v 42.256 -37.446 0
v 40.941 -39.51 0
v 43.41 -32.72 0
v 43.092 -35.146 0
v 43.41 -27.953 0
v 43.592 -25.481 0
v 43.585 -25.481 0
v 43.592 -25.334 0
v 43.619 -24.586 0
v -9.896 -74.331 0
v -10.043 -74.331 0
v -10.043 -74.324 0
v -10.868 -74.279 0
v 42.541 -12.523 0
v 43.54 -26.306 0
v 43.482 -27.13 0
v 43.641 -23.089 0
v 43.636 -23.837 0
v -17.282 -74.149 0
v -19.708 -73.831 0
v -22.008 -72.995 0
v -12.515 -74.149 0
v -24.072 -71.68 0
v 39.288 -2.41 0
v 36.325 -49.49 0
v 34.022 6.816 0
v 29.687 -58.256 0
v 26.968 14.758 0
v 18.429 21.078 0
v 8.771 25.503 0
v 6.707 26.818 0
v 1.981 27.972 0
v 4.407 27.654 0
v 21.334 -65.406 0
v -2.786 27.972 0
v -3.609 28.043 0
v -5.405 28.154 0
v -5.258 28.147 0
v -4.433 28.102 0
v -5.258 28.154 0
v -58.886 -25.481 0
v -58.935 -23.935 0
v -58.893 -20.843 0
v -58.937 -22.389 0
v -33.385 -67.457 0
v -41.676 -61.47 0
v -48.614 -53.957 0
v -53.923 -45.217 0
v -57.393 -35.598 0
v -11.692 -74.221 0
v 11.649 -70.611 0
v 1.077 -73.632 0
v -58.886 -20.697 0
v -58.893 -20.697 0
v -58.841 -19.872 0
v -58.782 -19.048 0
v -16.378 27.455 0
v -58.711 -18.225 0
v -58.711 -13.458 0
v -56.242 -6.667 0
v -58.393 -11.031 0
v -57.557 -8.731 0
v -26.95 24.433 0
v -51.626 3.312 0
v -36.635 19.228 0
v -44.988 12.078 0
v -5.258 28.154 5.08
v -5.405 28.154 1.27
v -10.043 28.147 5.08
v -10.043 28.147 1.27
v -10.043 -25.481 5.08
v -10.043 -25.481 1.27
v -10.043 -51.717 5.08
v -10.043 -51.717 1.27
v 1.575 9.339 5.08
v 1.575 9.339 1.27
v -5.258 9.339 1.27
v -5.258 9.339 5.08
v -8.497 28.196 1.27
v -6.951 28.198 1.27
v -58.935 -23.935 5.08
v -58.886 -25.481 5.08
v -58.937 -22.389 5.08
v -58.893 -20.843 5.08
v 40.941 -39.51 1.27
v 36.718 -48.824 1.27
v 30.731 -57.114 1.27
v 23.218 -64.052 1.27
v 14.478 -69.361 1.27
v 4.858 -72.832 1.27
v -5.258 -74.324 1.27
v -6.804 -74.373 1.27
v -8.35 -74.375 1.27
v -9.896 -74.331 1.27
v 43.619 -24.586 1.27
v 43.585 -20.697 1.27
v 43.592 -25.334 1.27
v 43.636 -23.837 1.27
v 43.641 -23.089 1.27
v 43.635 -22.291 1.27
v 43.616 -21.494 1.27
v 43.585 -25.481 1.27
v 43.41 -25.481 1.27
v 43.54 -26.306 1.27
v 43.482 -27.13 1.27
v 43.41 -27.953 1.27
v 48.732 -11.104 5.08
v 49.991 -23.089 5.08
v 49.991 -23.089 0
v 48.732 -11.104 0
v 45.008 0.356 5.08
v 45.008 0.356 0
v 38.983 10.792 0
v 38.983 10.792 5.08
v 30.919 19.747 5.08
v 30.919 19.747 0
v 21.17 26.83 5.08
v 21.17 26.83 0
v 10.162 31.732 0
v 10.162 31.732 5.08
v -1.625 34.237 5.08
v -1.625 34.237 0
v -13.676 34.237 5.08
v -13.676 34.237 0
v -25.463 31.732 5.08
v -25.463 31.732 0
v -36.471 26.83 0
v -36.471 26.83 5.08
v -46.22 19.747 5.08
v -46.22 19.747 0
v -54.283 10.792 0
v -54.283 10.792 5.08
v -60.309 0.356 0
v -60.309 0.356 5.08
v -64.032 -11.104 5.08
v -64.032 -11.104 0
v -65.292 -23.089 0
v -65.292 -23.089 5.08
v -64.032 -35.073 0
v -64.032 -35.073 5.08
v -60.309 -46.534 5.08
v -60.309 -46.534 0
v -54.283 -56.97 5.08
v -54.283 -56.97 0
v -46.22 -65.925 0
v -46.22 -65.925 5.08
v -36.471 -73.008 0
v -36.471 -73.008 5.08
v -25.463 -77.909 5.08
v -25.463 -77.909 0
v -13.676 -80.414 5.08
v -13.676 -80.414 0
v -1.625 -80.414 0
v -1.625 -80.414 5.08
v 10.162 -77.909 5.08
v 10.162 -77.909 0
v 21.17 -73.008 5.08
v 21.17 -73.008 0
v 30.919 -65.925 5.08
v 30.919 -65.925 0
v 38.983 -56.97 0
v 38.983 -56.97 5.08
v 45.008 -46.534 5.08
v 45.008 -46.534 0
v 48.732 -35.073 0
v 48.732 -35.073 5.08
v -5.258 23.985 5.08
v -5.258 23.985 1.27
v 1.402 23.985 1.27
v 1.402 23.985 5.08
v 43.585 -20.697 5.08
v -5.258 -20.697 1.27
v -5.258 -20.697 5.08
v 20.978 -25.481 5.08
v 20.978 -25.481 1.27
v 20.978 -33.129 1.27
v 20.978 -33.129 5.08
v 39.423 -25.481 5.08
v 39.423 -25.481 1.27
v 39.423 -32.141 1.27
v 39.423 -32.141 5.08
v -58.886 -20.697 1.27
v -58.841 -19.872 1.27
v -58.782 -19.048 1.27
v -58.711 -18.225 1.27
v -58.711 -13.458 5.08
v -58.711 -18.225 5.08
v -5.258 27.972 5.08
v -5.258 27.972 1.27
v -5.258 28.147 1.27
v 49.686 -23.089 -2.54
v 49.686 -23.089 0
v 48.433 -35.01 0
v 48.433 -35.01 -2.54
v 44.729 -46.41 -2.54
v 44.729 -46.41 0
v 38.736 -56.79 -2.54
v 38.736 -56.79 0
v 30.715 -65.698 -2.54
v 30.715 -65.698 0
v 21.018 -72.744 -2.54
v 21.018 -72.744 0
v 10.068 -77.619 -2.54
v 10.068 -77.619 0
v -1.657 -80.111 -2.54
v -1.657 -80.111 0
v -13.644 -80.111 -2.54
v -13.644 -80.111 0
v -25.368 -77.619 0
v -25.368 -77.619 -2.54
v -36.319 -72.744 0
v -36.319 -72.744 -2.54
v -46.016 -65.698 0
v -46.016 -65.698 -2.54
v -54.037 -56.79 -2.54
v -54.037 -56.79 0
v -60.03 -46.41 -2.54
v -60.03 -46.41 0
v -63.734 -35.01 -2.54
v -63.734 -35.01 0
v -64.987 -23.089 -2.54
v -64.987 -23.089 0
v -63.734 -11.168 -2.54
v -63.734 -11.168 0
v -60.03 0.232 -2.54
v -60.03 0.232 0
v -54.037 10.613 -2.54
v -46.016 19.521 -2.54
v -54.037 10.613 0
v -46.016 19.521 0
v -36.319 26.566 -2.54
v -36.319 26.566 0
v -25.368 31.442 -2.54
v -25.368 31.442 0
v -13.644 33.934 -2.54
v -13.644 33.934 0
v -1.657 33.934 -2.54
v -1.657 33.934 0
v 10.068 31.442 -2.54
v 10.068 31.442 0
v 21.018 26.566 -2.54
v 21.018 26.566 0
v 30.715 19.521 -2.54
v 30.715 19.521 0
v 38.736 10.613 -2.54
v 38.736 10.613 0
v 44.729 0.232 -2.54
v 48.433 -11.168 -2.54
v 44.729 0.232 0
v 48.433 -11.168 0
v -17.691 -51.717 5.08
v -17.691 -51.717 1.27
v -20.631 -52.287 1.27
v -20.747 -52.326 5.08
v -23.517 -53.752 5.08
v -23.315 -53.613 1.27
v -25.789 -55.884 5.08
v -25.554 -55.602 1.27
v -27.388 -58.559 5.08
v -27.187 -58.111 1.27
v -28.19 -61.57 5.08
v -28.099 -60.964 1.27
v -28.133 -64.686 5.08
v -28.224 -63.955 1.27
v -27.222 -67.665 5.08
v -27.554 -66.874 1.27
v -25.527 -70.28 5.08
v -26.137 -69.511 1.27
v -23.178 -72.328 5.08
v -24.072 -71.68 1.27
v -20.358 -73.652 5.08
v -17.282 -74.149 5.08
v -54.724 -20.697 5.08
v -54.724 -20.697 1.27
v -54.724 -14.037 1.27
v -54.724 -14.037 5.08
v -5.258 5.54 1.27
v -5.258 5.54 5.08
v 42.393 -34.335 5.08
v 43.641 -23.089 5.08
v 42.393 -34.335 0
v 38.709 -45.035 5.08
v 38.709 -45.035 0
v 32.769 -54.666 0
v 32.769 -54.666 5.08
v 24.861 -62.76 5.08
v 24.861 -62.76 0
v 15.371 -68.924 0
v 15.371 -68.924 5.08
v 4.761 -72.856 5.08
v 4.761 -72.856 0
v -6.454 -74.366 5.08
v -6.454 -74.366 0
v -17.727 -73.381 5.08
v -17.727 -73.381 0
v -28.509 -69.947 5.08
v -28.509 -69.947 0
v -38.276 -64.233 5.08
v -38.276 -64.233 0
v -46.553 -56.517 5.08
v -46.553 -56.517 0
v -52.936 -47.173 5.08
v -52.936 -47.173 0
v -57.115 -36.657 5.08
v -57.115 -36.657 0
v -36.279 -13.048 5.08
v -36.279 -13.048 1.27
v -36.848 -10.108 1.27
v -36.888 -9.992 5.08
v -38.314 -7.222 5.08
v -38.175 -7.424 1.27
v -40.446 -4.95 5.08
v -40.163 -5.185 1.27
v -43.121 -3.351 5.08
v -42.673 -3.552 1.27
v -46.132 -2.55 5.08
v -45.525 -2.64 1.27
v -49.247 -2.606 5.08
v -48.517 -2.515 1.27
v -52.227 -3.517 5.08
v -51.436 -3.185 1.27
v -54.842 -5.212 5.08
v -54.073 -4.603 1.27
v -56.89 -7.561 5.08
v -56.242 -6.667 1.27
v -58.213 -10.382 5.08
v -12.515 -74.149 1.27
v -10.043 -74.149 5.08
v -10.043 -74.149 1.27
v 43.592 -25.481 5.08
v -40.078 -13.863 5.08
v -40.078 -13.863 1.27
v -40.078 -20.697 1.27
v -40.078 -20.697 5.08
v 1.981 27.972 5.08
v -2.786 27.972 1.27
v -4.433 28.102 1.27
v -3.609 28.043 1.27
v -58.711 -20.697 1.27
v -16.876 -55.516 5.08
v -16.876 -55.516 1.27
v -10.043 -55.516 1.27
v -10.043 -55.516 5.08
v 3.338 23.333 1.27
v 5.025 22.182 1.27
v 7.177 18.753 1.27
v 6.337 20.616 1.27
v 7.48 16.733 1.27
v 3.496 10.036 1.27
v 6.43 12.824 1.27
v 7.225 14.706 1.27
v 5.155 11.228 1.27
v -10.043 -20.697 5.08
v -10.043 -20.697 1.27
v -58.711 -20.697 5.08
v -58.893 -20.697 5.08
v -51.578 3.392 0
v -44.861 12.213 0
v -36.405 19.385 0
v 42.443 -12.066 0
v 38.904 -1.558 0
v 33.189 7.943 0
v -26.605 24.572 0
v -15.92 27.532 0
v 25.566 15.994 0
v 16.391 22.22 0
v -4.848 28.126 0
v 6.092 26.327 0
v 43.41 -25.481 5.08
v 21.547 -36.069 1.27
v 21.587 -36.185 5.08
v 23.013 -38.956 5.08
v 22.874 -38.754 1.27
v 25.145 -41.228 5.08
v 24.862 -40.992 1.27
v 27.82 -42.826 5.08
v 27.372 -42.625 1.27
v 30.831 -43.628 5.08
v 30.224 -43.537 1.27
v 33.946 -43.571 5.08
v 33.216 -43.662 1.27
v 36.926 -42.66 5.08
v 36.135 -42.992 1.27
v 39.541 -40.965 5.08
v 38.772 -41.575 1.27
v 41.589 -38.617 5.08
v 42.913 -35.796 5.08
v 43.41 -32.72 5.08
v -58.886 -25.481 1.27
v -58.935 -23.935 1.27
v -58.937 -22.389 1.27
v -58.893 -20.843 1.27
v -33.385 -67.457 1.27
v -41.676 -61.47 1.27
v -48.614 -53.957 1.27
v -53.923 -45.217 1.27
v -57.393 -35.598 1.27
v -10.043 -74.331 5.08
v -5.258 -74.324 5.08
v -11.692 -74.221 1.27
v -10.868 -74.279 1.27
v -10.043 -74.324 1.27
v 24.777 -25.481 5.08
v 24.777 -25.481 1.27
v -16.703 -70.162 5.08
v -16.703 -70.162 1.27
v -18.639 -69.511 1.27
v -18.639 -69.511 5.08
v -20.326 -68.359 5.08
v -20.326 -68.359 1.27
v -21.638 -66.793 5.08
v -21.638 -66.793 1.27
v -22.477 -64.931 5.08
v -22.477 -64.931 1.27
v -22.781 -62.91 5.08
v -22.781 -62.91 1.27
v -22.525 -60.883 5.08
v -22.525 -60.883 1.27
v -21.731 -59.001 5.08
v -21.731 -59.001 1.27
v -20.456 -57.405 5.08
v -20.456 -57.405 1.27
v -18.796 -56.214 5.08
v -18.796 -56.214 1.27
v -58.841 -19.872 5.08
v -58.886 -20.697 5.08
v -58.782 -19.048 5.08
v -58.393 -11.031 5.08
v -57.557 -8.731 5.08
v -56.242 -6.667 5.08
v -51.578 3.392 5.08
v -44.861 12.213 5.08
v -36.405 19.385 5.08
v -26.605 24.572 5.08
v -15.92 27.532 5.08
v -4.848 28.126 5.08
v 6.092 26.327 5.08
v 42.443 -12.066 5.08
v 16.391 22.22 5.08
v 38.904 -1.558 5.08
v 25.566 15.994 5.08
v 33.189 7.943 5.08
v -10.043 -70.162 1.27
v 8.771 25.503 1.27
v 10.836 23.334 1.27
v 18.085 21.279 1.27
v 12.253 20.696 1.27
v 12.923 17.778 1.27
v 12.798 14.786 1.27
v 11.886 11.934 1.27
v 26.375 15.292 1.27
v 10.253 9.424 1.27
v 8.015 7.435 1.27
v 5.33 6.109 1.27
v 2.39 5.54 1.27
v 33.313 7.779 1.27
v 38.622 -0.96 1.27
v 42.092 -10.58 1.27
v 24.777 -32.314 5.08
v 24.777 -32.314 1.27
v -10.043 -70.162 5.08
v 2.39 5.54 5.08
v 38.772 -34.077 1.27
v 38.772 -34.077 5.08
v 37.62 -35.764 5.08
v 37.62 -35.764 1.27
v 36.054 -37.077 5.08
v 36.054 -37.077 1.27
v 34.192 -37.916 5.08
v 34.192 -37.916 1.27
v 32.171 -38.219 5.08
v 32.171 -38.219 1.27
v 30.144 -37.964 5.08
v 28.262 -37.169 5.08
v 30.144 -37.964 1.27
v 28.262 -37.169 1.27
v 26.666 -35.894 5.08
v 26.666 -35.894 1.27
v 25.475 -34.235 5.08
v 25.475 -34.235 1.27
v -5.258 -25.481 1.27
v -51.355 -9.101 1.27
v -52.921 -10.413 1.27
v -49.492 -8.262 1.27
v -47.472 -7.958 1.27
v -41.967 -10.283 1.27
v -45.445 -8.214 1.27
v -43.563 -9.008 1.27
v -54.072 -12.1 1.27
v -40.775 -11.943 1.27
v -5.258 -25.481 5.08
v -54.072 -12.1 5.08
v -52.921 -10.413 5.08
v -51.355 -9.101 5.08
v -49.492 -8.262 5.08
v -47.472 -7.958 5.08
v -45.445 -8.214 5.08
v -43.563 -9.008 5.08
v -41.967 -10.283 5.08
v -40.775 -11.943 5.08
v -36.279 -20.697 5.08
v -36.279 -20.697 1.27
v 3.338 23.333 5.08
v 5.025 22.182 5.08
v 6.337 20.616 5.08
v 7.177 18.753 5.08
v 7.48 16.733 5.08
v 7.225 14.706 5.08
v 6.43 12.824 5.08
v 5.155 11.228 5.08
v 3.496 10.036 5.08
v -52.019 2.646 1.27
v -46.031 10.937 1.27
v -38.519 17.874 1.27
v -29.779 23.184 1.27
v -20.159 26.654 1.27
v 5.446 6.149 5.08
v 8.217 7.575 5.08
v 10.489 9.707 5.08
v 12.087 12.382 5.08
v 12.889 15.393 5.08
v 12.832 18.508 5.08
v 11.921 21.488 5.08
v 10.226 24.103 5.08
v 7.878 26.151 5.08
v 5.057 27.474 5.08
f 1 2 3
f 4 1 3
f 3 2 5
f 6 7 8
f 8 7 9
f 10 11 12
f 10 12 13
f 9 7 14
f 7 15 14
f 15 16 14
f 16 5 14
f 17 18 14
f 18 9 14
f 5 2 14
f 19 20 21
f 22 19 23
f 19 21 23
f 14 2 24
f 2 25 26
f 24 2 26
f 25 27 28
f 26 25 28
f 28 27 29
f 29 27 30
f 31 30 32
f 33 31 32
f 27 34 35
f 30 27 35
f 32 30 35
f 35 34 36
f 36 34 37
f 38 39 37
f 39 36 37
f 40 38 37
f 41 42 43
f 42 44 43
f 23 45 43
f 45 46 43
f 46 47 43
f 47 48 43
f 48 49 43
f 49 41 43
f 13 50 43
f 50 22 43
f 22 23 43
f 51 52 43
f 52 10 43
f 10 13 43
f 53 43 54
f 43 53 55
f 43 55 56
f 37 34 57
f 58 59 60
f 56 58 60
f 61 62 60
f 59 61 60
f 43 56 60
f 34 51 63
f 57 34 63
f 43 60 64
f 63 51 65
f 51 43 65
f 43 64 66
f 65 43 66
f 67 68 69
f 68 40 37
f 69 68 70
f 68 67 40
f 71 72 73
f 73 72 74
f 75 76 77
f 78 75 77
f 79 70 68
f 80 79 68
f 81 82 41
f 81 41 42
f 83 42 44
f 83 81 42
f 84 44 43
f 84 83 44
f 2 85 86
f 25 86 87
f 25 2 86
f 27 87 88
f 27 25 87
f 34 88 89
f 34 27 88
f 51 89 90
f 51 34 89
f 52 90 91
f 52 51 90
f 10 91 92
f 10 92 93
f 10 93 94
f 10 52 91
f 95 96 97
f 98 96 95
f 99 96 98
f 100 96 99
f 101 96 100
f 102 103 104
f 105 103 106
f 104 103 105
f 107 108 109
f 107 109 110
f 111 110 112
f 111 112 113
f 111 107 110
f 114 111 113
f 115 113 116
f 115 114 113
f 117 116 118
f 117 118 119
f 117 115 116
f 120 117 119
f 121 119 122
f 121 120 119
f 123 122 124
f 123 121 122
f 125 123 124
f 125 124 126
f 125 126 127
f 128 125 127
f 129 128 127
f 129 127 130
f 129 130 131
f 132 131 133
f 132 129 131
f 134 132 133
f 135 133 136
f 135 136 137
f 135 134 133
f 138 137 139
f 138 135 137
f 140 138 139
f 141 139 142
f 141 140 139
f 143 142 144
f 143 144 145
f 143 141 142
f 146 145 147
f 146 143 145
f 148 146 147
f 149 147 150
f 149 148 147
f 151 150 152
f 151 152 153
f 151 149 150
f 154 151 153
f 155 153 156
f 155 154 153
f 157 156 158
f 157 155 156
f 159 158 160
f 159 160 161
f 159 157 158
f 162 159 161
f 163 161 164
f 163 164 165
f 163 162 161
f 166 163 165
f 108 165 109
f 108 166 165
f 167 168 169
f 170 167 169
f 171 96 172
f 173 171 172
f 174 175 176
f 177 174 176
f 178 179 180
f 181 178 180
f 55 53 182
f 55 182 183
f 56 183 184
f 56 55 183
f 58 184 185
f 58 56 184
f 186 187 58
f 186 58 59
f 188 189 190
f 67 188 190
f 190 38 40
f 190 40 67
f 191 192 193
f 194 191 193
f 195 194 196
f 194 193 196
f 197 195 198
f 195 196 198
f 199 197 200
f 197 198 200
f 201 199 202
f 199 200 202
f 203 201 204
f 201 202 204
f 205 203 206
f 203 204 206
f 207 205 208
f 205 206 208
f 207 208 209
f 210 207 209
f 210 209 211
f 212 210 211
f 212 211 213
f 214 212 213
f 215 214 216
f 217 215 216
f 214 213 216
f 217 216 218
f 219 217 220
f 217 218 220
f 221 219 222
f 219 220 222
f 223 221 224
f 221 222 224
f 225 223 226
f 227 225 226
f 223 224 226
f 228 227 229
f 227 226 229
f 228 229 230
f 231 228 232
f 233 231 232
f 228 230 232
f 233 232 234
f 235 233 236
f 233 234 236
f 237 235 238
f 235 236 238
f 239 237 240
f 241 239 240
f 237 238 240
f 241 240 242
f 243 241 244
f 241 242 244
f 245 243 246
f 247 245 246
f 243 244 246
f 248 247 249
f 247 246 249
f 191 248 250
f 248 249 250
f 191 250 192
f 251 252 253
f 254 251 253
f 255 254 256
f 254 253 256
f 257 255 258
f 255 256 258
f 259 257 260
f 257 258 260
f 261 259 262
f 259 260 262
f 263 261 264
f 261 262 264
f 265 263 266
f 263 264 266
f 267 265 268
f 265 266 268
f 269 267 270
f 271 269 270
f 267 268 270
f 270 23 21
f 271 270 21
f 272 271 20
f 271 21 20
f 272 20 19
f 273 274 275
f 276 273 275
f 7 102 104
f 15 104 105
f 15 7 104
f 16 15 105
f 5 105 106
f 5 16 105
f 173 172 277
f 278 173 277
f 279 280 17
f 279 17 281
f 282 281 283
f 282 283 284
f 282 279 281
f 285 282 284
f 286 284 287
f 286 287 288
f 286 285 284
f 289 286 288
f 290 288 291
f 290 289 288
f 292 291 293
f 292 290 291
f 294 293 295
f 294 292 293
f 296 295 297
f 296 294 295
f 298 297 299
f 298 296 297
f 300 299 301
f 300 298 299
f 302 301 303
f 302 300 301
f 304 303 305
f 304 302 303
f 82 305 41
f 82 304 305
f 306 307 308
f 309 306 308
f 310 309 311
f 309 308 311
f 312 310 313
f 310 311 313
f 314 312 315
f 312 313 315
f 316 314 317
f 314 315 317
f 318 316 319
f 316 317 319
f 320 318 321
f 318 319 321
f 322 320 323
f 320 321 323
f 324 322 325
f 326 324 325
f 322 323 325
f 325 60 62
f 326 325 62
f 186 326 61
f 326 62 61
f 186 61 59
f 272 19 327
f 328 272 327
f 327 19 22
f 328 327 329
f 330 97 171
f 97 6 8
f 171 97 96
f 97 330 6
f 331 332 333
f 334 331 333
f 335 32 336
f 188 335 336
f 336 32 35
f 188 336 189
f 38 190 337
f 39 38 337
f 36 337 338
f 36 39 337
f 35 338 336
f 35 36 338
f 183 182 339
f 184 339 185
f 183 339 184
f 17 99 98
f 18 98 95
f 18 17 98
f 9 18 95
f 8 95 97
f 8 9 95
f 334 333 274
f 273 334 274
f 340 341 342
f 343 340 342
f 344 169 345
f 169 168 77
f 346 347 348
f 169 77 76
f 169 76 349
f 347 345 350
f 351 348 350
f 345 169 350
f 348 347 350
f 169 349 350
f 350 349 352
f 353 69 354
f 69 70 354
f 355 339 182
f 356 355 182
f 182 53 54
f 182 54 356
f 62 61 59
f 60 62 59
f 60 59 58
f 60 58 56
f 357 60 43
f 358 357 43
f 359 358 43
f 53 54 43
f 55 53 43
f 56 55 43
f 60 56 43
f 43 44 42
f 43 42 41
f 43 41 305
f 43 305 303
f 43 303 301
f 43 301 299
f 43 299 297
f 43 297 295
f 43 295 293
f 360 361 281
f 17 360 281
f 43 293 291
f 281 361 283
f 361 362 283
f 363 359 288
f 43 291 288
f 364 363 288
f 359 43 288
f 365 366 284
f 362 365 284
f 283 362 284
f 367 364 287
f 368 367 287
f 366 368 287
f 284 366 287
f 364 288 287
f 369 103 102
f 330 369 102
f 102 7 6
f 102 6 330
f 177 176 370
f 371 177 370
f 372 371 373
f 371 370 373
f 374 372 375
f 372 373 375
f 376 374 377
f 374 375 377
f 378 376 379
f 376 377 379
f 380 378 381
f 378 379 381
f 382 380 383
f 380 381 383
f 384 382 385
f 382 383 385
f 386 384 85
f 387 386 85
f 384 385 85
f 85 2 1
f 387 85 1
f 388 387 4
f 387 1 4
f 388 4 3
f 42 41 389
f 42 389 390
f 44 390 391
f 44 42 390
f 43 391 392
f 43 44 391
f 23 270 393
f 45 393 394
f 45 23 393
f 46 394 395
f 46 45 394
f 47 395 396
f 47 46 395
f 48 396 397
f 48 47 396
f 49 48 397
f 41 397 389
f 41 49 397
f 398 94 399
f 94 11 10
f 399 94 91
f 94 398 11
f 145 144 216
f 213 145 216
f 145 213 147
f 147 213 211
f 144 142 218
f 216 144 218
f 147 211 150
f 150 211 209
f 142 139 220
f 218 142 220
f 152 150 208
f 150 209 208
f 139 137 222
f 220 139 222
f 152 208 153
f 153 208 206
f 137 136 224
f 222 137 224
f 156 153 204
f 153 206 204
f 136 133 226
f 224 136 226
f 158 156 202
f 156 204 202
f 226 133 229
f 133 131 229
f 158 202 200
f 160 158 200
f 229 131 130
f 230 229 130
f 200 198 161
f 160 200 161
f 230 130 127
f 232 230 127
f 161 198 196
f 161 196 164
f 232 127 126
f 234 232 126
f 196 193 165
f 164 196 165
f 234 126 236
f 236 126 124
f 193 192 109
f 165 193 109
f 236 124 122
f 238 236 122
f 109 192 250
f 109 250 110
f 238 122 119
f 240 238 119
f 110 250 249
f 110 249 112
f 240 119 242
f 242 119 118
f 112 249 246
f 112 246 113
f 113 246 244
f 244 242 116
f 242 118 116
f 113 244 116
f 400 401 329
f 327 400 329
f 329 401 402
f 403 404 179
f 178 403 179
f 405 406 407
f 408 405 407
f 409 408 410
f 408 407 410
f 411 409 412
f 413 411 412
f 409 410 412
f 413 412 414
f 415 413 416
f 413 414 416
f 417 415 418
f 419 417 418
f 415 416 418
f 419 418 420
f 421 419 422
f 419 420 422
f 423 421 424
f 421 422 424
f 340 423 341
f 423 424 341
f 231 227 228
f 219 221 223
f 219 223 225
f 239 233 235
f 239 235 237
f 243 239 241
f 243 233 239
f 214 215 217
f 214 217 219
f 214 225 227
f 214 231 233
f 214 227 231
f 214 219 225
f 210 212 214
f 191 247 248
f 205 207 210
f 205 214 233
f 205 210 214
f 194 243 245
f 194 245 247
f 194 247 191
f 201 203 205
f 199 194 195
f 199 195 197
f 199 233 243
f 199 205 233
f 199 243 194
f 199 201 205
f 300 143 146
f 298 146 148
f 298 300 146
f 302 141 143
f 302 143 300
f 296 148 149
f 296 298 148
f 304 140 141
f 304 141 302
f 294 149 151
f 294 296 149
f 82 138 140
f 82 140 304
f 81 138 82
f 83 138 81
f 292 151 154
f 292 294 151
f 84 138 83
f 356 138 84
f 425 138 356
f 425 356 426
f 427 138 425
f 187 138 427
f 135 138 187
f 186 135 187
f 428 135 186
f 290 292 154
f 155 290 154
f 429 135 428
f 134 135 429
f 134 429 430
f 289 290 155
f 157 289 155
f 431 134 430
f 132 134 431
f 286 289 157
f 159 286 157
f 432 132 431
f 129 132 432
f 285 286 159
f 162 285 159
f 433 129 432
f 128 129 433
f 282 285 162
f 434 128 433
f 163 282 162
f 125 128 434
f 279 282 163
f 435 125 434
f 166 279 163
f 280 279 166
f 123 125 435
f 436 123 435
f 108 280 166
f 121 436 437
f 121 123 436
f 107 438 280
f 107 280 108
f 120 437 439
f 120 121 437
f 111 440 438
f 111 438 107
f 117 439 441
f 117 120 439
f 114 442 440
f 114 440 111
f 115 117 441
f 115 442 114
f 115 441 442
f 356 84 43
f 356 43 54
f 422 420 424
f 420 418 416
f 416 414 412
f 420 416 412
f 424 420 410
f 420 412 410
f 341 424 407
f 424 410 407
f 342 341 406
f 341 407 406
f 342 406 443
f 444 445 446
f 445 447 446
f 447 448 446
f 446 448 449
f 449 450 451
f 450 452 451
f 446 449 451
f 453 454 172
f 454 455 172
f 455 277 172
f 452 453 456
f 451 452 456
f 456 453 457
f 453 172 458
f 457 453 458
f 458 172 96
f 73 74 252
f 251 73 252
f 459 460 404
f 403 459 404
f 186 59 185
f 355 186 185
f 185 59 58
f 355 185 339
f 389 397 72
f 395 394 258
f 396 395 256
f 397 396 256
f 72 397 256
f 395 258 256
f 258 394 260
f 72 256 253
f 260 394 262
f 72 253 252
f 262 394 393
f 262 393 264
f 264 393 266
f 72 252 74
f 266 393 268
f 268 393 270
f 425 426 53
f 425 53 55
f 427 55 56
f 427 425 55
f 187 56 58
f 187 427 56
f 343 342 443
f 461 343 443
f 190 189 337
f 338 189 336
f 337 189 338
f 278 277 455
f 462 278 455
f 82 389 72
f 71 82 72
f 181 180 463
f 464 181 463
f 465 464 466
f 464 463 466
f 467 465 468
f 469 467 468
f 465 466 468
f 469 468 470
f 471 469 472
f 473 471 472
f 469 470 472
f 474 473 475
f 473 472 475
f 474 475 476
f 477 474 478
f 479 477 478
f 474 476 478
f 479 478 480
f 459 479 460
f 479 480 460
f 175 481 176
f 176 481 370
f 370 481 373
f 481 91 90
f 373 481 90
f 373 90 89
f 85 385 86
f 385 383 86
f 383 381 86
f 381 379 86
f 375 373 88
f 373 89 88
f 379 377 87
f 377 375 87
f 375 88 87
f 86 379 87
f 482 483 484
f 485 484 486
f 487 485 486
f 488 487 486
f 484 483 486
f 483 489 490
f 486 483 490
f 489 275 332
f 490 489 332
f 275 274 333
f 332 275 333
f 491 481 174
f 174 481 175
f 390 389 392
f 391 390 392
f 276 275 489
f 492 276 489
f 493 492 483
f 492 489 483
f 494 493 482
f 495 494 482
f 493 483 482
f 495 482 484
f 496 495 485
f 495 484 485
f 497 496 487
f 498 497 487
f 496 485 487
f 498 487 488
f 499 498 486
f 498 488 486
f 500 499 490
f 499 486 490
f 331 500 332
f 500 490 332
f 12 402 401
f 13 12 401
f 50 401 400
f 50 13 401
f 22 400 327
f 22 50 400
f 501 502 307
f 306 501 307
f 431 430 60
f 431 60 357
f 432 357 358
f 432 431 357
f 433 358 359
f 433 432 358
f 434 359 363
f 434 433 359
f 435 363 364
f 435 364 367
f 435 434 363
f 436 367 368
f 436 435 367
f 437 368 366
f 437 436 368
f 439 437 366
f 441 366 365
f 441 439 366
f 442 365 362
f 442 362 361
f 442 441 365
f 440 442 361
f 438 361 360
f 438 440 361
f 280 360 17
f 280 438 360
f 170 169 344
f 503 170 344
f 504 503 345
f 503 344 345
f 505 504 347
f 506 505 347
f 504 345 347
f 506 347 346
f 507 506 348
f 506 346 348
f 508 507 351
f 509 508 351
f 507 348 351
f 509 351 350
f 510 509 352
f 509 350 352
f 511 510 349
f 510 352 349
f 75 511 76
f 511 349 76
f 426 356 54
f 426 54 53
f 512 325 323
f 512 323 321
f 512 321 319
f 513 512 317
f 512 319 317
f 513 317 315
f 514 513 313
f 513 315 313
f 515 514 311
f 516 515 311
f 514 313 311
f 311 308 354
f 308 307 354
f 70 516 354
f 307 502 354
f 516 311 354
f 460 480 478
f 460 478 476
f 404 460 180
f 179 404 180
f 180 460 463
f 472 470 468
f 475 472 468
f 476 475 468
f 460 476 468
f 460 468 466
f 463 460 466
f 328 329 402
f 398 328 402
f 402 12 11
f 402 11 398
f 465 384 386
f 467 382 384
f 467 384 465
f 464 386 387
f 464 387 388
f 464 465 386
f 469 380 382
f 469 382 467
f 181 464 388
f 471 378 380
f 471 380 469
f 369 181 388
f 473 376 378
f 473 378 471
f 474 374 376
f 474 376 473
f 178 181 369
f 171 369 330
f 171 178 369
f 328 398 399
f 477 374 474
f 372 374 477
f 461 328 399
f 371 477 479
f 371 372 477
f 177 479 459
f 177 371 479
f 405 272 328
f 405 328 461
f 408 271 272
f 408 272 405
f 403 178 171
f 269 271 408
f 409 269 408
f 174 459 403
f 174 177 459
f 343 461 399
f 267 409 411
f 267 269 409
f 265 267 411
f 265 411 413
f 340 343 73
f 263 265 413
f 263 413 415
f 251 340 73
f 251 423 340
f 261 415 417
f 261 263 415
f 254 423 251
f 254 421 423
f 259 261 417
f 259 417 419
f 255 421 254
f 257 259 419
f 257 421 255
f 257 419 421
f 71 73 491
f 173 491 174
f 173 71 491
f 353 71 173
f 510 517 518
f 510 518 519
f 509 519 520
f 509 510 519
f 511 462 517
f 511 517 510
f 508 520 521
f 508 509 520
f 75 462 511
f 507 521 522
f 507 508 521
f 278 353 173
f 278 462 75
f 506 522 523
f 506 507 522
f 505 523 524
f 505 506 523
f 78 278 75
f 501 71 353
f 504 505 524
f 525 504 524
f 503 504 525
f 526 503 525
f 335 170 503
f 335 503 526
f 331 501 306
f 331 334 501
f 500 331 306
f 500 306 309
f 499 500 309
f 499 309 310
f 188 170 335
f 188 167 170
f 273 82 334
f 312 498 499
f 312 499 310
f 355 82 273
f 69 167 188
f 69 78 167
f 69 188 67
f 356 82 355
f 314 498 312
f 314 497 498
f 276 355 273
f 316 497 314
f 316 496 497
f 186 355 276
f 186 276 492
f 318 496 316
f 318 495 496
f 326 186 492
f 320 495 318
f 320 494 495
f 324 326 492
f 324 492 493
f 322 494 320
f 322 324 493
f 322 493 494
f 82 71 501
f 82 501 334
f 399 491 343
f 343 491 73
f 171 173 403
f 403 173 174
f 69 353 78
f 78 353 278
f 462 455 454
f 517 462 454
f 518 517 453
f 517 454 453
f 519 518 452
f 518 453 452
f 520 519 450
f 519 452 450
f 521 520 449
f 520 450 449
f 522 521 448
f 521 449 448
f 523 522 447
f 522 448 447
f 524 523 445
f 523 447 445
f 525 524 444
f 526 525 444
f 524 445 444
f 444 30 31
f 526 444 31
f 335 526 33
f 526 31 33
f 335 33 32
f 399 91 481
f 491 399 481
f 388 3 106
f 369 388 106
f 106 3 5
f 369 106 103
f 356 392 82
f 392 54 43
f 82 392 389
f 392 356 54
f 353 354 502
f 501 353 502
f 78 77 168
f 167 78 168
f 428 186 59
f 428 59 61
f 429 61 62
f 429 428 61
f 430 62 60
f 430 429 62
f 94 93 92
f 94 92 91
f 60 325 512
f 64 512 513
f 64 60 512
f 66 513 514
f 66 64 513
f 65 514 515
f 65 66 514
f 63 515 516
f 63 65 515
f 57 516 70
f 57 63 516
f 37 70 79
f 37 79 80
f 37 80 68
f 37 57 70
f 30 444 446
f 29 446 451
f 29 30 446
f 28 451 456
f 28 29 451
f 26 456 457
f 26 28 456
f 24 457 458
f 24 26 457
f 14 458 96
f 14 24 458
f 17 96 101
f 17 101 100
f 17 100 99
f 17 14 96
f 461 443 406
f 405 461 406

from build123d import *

# Parameters (mm, degrees)
F1_DEPTH = 5.08
F3_COUNT = 4
F4_R     = 57.6415248938
F5_DEPTH = 5.0800000317
F6_R     = 57.3366696562
F7_DEPTH = 2.54
F8_DEPTH = 1.27


with BuildPart() as f1:
    # F0 (on Top) → F1 (new body)
    with BuildSketch(Plane.XY):
        Polygon((-5.2582197823, 28.1538348645), (-10.0426170975, 28.1469915062), (-10.0426170975, -23.0887178332), (-5.2582197823, -23.0887178332), (-5.2582197823, 5.5397343822), (-5.2582197823, 9.3388566747), (-5.2582197823, 23.9849314094), (-5.2582197823, 27.9716439545), align=None)
        with BuildLine():
            Line((1.9807802177, 27.9716439545), (-5.2582197823, 27.9716439545))
            Line((-5.2582197823, 27.9716439545), (-5.2582197823, 23.9849314094))
            Line((-5.2582197823, 23.9849314094), (1.4016701607, 23.9849314094))
            ThreePointArc((1.4016701607, 23.9849314094), (7.4798763217, 16.7329380114), (1.5753391199, 9.3388566747))
            Line((1.5753391199, 9.3388566747), (-5.2582197823, 9.3388566747))
            Line((-5.2582197823, 9.3388566747), (-5.2582197823, 5.5397343822))
            Line((-5.2582197823, 5.5397343822), (2.390121635, 5.5397343822))
            ThreePointArc((2.390121635, 5.5397343822), (12.9688554502, 16.952466624), (1.9807802177, 27.9716439545))
        make_face()
    extrude(amount=F1_DEPTH)


with BuildPart() as f3_1:
    # F3: instance of F1
    add(f1.part.rotate(Axis((-7.6504184399, -23.0887178332, 2.54), (0, 0, -1)), 1 * 360 / F3_COUNT))


with BuildPart() as f3_2:
    # F3: instance of F1
    add(f1.part.rotate(Axis((-7.6504184399, -23.0887178332, 2.54), (0, 0, -1)), 2 * 360 / F3_COUNT))


with BuildPart() as f3_3:
    # F3: instance of F1
    add(f1.part.rotate(Axis((-7.6504184399, -23.0887178332, 2.54), (0, 0, -1)), 3 * 360 / F3_COUNT))


with BuildPart() as f5:
    # F4 (on face) → F5 (new body)
    with BuildSketch(Plane.XY.offset(5.08)):
        with Locations((-7.6504184399, -23.0887178332)):
            Circle(F4_R)
        with BuildLine():
            ThreePointArc((43.6411064539, -23.0887178332), (-6.4539935787, -74.3662869397), (-58.8861277793, -25.4809164908))
            ThreePointArc((-58.8861277793, -25.4809164908), (-58.9418908651, -23.1620825433), (-58.8927614778, -20.8430985631))
            Line((-58.8927614778, -20.8430985631), (-58.8929711375, -20.6965191755))
            Line((-58.8929711375, -20.6965191755), (-58.8861277793, -20.6965191755))
            ThreePointArc((-58.8861277793, -20.6965191755), (-58.8133853302, -19.4594830782), (-58.7107802276, -18.2245652823))
            Line((-58.7107802276, -18.2245652823), (-58.7107802276, -13.4575191755))
            ThreePointArc((-58.7107802276, -13.4575191755), (-58.0376423972, -9.8582625341), (-56.2420833712, -6.6670667248))
            ThreePointArc((-56.2420833712, -6.6670667248), (0.6706372164, 27.5233415864), (43.6411064539, -23.0887178332))
        make_face(mode=Mode.SUBTRACT)
    extrude(amount=-F5_DEPTH)

    # F6 (on face) → F7 (join)
    with BuildSketch(Plane(origin=(0, 0, 0), x_dir=(1, 0, 0), z_dir=(0, 0, -1))):
        with Locations((-7.6504184399, 23.0887178332)):
            Circle(F6_R)
    extrude(amount=F7_DEPTH)


with BuildPart() as f1_1:
    add(f1.part)

    # F8 (add): a face of the model
    f8_faces = [f5.part.faces().sort_by_distance(p)[0] for p in [
        (-7.6873982389, -23.0802766419, 0),
    ]]

    add(f3_1.part)  # F8 merges F3_1

    add(f3_2.part)  # F8 merges F3_2

    add(f3_3.part)  # F8 merges F3_3
    extrude(f8_faces, amount=F8_DEPTH)


solid = Compound([f5.part, f1_1.part])
